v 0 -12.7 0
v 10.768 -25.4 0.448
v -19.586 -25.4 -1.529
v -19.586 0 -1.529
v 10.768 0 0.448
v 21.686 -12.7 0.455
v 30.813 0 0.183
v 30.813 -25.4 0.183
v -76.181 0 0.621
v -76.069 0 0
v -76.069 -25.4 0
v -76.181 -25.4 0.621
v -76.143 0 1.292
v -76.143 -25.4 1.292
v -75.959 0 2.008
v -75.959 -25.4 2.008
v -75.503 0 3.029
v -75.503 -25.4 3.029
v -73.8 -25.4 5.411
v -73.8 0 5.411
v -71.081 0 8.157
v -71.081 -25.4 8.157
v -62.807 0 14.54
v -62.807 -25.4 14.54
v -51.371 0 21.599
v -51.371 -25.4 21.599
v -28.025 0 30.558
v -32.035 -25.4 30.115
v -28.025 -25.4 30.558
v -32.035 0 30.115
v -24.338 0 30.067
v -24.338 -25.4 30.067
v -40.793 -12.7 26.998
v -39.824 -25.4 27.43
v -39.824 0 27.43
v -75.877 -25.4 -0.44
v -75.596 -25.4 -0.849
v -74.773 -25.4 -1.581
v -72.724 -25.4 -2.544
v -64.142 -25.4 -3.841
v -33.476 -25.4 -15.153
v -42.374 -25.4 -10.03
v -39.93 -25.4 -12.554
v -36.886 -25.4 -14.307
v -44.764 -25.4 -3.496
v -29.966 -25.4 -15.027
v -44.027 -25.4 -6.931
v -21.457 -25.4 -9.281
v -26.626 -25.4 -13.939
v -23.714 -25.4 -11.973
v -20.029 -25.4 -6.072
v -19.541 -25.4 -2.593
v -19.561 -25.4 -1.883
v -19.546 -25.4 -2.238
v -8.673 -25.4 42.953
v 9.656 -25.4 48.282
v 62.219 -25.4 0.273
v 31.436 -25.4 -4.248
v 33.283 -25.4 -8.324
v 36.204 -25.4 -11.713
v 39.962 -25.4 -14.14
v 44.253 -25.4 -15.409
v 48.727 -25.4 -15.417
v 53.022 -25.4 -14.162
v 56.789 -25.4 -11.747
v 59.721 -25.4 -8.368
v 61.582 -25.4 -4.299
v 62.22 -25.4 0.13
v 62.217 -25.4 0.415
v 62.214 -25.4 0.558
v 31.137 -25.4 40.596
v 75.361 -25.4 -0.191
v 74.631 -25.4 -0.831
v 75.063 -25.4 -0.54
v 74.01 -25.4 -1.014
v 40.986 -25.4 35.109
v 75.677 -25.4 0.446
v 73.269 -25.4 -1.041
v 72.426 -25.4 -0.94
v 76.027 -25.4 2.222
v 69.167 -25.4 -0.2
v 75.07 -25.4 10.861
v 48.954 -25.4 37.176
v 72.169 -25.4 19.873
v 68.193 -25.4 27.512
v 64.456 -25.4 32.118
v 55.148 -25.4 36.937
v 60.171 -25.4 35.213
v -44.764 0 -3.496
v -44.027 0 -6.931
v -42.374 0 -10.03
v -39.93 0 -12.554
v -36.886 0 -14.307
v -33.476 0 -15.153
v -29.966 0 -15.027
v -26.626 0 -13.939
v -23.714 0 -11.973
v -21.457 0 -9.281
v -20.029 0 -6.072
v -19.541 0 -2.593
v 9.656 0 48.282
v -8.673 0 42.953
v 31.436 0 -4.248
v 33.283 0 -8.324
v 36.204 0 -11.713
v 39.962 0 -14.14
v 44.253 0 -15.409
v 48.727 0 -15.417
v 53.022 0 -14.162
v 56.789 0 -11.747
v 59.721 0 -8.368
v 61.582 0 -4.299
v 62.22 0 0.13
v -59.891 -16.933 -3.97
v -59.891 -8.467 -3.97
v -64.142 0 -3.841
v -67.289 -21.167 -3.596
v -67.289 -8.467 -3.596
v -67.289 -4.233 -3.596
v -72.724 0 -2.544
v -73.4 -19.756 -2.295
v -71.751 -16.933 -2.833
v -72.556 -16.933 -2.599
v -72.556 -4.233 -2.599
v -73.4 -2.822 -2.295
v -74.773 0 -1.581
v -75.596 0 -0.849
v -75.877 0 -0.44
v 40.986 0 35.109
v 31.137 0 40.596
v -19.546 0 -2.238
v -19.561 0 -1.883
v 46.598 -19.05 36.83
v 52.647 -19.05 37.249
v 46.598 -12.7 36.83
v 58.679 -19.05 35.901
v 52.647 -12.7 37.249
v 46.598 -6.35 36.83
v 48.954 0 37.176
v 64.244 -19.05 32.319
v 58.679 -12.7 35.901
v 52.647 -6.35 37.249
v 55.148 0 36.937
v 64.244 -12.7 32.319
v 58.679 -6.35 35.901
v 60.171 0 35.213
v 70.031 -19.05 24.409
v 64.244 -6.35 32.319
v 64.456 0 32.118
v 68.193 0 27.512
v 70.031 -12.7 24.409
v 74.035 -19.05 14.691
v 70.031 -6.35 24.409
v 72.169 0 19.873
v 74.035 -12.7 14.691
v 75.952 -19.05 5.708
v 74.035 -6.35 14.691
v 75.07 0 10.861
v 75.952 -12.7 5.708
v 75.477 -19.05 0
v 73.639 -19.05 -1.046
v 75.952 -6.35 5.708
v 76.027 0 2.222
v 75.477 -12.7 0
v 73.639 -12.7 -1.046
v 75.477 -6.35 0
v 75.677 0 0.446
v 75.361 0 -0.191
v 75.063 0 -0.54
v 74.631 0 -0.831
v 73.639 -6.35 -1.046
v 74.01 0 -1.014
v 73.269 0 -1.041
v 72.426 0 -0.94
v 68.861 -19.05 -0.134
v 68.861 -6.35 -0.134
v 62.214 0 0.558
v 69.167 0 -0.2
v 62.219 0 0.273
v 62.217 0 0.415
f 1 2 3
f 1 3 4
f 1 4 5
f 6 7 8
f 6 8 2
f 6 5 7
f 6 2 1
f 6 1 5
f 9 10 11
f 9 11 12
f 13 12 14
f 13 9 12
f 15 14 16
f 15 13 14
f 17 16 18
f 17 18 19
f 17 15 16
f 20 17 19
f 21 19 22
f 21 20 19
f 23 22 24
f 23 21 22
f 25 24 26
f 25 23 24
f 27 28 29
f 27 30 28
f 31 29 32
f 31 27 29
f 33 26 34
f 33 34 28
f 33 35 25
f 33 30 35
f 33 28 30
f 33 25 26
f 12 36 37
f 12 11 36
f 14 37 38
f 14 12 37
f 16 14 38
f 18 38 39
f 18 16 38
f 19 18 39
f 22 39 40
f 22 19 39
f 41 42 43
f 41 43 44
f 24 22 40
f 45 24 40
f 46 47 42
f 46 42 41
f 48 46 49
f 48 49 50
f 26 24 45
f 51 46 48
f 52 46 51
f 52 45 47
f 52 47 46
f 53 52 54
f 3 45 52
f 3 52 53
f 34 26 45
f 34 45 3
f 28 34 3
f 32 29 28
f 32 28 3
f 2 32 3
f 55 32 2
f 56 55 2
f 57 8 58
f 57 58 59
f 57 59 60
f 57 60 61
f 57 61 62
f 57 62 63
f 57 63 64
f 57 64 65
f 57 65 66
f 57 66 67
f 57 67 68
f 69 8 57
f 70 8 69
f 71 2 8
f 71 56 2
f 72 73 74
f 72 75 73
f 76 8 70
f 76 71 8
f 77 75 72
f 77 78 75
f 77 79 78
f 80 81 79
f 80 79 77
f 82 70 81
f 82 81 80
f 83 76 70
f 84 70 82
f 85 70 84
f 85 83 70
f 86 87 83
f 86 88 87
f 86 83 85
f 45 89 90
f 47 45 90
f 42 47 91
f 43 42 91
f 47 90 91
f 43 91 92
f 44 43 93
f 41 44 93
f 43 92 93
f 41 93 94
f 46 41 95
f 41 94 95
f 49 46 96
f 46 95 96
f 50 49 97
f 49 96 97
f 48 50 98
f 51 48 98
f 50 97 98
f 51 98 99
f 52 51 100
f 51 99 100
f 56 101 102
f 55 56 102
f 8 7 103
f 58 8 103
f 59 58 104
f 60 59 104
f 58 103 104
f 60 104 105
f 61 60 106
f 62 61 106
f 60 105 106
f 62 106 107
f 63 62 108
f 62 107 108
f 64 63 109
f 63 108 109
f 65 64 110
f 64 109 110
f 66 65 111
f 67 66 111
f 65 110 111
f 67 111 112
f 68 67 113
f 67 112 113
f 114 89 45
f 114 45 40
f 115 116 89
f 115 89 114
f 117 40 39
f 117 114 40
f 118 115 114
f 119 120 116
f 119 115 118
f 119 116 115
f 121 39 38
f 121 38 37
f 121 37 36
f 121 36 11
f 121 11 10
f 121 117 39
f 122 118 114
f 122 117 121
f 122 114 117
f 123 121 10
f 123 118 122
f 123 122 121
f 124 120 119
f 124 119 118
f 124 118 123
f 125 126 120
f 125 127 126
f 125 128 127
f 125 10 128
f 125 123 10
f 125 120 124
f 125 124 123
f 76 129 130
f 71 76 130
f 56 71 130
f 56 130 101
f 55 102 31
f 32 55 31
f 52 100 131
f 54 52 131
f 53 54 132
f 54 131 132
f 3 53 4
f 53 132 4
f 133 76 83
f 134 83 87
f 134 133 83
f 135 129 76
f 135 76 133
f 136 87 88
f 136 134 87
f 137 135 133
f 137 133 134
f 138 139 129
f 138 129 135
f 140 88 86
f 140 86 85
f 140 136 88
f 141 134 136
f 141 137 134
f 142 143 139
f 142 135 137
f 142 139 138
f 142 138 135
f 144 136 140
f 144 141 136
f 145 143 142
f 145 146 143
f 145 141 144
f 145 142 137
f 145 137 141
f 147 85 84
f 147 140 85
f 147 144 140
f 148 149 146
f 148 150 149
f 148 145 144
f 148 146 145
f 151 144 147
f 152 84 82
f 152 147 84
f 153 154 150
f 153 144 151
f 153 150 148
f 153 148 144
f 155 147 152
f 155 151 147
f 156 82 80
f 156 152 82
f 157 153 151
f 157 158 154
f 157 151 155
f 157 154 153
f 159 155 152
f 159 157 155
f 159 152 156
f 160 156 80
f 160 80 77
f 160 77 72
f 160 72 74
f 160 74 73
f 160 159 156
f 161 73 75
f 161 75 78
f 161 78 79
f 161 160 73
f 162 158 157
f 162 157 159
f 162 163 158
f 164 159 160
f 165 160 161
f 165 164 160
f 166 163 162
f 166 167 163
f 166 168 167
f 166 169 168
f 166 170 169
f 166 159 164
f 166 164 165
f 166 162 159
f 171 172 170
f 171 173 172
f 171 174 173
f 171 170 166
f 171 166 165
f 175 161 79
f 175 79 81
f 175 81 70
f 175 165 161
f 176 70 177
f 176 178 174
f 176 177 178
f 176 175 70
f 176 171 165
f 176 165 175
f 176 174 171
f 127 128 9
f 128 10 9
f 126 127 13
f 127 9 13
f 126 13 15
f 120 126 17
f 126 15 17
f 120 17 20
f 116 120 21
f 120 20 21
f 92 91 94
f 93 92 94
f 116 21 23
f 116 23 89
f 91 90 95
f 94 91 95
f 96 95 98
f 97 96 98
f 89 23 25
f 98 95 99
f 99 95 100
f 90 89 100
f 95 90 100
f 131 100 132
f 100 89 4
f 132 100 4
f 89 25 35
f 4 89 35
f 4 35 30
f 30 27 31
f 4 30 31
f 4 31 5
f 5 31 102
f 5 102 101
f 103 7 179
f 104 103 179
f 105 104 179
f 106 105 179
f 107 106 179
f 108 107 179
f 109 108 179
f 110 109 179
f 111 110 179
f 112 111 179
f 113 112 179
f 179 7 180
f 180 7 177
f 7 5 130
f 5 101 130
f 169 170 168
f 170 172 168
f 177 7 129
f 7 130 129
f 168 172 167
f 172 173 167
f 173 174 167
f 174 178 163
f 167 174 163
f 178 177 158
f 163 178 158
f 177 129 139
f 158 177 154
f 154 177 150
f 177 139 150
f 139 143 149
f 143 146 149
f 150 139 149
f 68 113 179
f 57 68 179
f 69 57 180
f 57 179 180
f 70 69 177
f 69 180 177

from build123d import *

# Parameters (mm, degrees)
F1_DEPTH = 25.4


with BuildPart() as f1:
    # F0 (on Front) → F1 (new body)
    with BuildSketch(Plane.XZ):
        with BuildLine():
            Line((-8.6731946755, 42.9527949154), (-24.3383222927, 30.0669412345))
            add(Edge.make_bspline(
                [(-24.3383222927, 30.0669412345), (-23.0718654676, 29.7350166515), (-15.1094692605, 26.5882488757), (2.485039585, 9.7718074119), (25.3038790792, 21.2101621684), (33.2612487533, 31.5505674903), (40.37705323, 34.8516540005), (40.9856548405, 35.1088173603)],
                knots=[0.1717480104, 0.1717480104, 0.1717480104, 0.1717480104, 0.1883148454, 0.2762767616, 0.3545129409, 0.4291718011, 0.435930476, 0.435930476, 0.435930476, 0.435930476], degree=3))
            Line((40.9856548405, 35.1088173603), (31.1368945986, 40.5962094665))
            Line((31.1368945986, 40.5962094665), (9.6563789994, 48.2818968594))
            Line((9.6563789994, 48.2818968594), (-8.6731946755, 42.9527949154))
        make_face()
        with BuildLine():
            ThreePointArc((-19.5857137795, -1.5286451453), (-33.1522016722, 9.9960189811), (-44.7636274981, -3.49628502))
            add(Edge.make_bspline(
                [(-19.5857137795, -1.5286451453), (-27.9763417286, -2.2521384598), (-36.7245412459, -3.0177792163), (-44.7636274981, -3.49628502)],
                knots=[0.884569908, 0.884569908, 0.884569908, 0.884569908, 0.9224512068, 0.9224512068, 0.9224512068, 0.9224512068], degree=3))
        make_face()
        with BuildLine():
            add(Edge.make_bspline(
                [(-19.5857137795, -1.5286451453), (-27.9763417286, -2.2521384598), (-36.7245412459, -3.0177792163), (-44.7636274981, -3.49628502)],
                knots=[0.884569908, 0.884569908, 0.884569908, 0.884569908, 0.9224512068, 0.9224512068, 0.9224512068, 0.9224512068], degree=3))
            ThreePointArc((-44.7636274981, -3.49628502), (-31.7165280277, -15.2127110064), (-19.5407610253, -2.5931967374))
            ThreePointArc((-19.5407610253, -2.5931967374), (-19.5520042191, -2.0604465984), (-19.5857137795, -1.5286451453))
        make_face()
        with BuildLine():
            ThreePointArc((62.2195018869, 0.1297362803), (62.2180401177, 0.3439942619), (62.2136550824, 0.5582123539))
            add(Edge.make_bspline(
                [(62.2136550824, 0.5582123539), (56.1039952959, 0.7354866845), (44.6938249497, -0.250725284), (34.6315513372, 0.0521268843), (30.8133880731, 0.1827009255)],
                knots=[0.680274905, 0.680274905, 0.680274905, 0.680274905, 0.7438953405, 0.7791297115, 0.7791297115, 0.7791297115, 0.7791297115], degree=3))
            ThreePointArc((30.8133880731, 0.1827009255), (46.4899179587, -15.5733429571), (62.2195018869, 0.1297362803))
        make_face()
        with BuildLine():
            add(Edge.make_bspline(
                [(62.2136550824, 0.5582123539), (56.1039952959, 0.7354866845), (44.6938249497, -0.250725284), (34.6315513372, 0.0521268843), (30.8133880731, 0.1827009255)],
                knots=[0.680274905, 0.680274905, 0.680274905, 0.680274905, 0.7438953405, 0.7791297115, 0.7791297115, 0.7791297115, 0.7791297115], degree=3))
            ThreePointArc((62.2136550824, 0.5582123539), (46.3286225372, 15.8317150841), (30.8133880731, 0.1827009255))
        make_face()
        with BuildLine():
            add(Edge.make_bspline(
                [(-76.0686248541, 0), (-78.0412827996, 6.1571760328), (-42.1797875874, 28.493098451), (-28.8833678396, 31.2581483235), (-24.3383222927, 30.0669412345)],
                knots=[0, 0, 0, 0, 0.1122931454, 0.1717480104, 0.1717480104, 0.1717480104, 0.1717480104], degree=3))
            add(Edge.make_bspline(
                [(-44.7636274981, -3.49628502), (-61.2208625603, -4.475859345), (-74.7063222614, -4.2520989979), (-76.0686248541, 0)],
                knots=[0.9224512068, 0.9224512068, 0.9224512068, 0.9224512068, 1, 1, 1, 1], degree=3))
            ThreePointArc((-44.7636274981, -3.49628502), (-33.1522016722, 9.9960189811), (-19.5857137795, -1.5286451453))
            add(Edge.make_bspline(
                [(30.8133880731, 0.1827009255), (22.8026692987, 0.4566525225), (9.921859959, 0.989481854), (-12.6048692675, -0.9267123263), (-19.5857137795, -1.5286451453)],
                knots=[0.7791297115, 0.7791297115, 0.7791297115, 0.7791297115, 0.8530533805, 0.884569908, 0.884569908, 0.884569908, 0.884569908], degree=3))
            ThreePointArc((30.8133880731, 0.1827009255), (46.3286225372, 15.8317150841), (62.2136550824, 0.5582123539))
            add(Edge.make_bspline(
                [(40.9856548405, 35.1088173603), (47.9787474019, 38.0637342515), (69.2089895431, 39.7151706763), (80.067385962, -4.847230922), (70.4602746753, -0.0040889696), (64.3874619474, 0.4951384398), (62.2136550824, 0.5582123539)],
                knots=[0.435930476, 0.435930476, 0.435930476, 0.435930476, 0.513590538, 0.61214352, 0.6576388592, 0.680274905, 0.680274905, 0.680274905, 0.680274905], degree=3))
            add(Edge.make_bspline(
                [(-24.3383222927, 30.0669412345), (-23.0718654676, 29.7350166515), (-15.1094692605, 26.5882488757), (2.485039585, 9.7718074119), (25.3038790792, 21.2101621684), (33.2612487533, 31.5505674903), (40.37705323, 34.8516540005), (40.9856548405, 35.1088173603)],
                knots=[0.1717480104, 0.1717480104, 0.1717480104, 0.1717480104, 0.1883148454, 0.2762767616, 0.3545129409, 0.4291718011, 0.435930476, 0.435930476, 0.435930476, 0.435930476], degree=3))
        make_face()
    extrude(amount=F1_DEPTH)


solid = f1.part
